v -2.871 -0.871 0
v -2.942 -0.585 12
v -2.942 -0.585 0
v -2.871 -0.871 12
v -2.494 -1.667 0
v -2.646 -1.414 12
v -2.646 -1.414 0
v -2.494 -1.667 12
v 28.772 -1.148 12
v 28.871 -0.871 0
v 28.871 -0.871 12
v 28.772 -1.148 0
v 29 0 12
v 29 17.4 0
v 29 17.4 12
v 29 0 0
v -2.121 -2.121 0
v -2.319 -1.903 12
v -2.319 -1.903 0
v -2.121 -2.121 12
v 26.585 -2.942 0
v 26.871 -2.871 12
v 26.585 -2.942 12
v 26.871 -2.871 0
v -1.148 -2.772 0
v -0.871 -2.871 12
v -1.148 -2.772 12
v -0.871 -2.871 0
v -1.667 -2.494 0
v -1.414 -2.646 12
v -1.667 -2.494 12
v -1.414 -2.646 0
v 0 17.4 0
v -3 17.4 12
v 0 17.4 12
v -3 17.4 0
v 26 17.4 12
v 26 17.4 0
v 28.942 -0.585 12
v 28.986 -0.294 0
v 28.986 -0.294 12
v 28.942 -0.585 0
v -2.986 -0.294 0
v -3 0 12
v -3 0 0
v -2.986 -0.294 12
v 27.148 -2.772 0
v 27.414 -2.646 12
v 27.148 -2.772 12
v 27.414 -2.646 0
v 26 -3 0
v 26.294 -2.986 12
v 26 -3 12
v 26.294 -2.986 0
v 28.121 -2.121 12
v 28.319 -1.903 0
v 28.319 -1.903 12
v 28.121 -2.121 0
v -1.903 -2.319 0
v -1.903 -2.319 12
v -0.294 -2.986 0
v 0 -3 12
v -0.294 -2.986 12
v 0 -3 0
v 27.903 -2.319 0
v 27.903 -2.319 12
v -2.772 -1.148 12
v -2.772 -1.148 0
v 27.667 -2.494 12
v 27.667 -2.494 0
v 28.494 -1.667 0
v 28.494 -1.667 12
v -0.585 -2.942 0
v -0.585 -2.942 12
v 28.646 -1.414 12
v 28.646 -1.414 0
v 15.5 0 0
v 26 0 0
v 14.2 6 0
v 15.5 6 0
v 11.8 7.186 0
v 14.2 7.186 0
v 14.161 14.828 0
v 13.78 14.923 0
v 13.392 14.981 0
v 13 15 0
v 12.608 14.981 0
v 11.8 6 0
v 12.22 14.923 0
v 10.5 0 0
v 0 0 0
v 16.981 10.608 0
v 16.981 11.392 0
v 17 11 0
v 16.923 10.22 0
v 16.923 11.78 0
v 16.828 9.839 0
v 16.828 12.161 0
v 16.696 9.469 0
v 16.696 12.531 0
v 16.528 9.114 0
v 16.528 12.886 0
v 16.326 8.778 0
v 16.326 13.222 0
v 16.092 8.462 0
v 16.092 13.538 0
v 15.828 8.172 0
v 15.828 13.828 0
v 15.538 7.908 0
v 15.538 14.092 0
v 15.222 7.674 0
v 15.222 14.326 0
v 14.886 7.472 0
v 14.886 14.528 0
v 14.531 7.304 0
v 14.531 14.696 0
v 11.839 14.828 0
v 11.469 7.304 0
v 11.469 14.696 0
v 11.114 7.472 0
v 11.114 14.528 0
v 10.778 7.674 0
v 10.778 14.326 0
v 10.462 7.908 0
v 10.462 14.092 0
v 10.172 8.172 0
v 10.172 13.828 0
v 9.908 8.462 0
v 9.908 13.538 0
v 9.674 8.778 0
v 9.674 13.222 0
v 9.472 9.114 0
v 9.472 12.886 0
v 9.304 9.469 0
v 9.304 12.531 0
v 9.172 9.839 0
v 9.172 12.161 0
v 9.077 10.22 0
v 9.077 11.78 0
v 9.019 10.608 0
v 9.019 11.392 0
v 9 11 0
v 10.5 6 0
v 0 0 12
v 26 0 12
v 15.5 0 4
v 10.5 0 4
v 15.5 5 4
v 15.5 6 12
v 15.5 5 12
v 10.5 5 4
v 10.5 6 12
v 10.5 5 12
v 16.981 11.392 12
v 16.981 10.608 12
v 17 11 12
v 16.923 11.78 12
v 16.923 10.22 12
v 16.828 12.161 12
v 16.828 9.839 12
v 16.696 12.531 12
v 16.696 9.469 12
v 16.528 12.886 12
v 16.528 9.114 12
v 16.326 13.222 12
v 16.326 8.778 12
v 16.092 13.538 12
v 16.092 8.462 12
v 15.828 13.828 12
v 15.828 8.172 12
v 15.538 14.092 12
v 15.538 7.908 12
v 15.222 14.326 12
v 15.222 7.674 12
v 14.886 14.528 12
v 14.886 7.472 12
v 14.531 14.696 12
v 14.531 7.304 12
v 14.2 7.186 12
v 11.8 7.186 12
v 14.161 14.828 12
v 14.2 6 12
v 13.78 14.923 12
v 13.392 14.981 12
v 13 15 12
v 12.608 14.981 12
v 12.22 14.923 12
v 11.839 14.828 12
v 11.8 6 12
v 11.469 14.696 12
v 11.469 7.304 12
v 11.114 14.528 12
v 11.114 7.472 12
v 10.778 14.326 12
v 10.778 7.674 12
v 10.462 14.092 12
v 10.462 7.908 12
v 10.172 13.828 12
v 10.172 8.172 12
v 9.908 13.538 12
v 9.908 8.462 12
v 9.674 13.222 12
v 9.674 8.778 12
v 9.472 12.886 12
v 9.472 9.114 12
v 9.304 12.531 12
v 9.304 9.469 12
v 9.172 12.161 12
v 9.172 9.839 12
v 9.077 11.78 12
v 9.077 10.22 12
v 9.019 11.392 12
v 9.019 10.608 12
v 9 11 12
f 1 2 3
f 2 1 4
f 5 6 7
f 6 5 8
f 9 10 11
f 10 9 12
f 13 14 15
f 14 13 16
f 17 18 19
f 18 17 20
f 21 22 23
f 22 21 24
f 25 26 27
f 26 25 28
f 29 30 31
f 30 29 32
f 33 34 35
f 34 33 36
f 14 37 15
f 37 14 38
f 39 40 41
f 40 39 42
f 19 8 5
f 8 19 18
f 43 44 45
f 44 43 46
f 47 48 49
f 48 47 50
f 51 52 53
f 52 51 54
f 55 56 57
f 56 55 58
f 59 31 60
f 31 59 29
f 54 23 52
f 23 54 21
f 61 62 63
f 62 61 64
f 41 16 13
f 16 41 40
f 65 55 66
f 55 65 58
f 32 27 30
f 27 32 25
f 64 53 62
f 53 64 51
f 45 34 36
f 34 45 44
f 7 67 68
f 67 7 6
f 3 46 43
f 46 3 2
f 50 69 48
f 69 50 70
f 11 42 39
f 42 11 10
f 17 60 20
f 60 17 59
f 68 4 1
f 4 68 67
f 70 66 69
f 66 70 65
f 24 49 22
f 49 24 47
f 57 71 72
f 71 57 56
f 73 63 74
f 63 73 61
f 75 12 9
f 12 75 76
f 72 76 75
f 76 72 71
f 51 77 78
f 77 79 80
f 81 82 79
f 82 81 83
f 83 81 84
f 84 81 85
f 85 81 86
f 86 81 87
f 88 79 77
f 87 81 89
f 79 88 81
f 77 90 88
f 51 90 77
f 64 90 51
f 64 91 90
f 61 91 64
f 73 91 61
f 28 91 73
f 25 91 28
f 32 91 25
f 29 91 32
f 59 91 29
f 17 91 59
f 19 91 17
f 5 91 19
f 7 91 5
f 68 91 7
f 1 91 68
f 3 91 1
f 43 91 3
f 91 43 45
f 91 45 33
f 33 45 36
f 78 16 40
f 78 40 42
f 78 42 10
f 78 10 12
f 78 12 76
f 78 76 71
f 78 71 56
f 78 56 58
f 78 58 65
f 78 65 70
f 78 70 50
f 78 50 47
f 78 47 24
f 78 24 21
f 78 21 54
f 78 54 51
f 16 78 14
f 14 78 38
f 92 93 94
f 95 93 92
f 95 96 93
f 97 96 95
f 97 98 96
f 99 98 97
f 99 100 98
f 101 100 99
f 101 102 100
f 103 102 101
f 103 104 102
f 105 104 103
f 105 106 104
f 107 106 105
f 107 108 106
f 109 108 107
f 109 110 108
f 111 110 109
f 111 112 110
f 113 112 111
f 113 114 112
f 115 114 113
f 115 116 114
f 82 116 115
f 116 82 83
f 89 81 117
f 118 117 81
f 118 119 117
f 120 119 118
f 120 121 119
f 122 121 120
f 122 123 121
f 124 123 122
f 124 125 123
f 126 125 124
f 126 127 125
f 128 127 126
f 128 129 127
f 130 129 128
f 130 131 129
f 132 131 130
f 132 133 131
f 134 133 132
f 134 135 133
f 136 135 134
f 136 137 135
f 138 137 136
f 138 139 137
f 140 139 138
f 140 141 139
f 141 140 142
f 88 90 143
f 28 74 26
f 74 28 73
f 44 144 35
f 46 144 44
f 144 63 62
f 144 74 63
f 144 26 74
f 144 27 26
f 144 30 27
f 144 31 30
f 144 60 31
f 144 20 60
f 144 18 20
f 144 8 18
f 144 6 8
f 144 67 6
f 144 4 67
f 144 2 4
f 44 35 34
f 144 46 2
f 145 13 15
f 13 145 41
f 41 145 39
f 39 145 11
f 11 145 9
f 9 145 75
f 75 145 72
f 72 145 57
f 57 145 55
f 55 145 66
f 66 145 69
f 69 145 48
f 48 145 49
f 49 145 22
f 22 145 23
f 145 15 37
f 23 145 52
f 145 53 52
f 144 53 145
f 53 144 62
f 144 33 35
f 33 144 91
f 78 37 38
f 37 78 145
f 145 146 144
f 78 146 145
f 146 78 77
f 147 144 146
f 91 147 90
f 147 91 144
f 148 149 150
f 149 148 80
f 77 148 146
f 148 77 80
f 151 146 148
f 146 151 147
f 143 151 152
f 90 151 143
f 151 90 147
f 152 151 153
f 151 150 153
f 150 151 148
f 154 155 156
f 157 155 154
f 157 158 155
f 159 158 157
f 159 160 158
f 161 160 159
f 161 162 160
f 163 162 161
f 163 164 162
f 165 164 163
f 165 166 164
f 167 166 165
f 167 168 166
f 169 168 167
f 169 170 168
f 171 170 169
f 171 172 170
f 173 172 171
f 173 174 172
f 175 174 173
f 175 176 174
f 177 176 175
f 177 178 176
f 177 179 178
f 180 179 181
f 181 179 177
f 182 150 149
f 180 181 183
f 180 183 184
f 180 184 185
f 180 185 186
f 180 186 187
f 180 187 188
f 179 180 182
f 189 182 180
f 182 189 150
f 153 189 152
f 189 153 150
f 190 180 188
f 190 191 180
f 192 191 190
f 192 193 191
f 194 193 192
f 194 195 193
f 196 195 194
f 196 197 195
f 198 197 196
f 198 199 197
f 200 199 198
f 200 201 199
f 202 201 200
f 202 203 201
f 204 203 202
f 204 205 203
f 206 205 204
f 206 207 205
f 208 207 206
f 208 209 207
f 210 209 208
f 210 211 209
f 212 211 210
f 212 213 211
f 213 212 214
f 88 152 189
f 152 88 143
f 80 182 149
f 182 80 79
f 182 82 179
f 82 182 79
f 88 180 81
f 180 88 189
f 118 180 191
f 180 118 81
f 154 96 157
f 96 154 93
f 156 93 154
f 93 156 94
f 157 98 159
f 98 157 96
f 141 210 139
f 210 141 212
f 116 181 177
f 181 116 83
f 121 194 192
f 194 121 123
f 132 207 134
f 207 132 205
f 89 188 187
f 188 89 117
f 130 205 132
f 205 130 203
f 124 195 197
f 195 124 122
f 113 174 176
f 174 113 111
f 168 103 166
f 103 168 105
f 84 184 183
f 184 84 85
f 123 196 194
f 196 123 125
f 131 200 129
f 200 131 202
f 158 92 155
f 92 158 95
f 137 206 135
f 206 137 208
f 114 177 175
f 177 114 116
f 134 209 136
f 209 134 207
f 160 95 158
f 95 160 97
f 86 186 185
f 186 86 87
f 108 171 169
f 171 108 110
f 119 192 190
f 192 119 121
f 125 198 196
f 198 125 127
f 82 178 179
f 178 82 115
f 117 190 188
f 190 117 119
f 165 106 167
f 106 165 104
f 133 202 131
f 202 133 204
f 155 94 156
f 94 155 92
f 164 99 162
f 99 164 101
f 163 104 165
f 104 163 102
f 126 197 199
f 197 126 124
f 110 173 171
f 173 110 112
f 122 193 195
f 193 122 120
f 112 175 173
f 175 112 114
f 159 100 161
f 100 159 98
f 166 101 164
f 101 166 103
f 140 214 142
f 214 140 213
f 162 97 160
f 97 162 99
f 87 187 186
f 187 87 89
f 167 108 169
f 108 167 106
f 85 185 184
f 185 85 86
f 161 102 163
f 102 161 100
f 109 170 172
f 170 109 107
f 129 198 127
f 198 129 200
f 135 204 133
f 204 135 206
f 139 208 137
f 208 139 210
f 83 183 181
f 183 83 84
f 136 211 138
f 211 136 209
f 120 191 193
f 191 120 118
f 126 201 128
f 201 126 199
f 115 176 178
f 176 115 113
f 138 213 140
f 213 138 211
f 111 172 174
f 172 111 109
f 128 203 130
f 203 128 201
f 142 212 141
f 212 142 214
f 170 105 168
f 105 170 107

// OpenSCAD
$fn=64;
cylinder_diamter = 8;
total_width = 12;
stem_diameter = 2.4;
stem_height = 2;

stem_width = total_width - 4;

corner_radius = 3;
inner_width = 26;
wall_strength = 3;

inner_corner_radius = corner_radius - wall_strength;
inner_inner_width = inner_width - (wall_strength * 2);

connector_cube_width = 5;
connector_cube_height = 5;
connector_cube_thickness = 4;
base_cube_height = 1;

difference() {
    hull() {
        cylinder(r=corner_radius, h=total_width);
        translate([inner_width, 0, 0]) cylinder(r=corner_radius, h=total_width);
        translate([-corner_radius, 0, 0]) cube([inner_width + (corner_radius * 2), 20.4 - corner_radius, total_width]);
    }

    color("green") hull() {
        cylinder(r=inner_corner_radius, h=total_width+2);
        translate([inner_width, 0, 0]) cylinder(r=inner_corner_radius, h=total_width+2);
        translate([-inner_corner_radius, 0, 0]) cube([inner_width + (inner_corner_radius * 2), 30, total_width+2]);
    }
}
color("red") translate([(inner_width / 2) - (connector_cube_width / 2), -3, 0]) cube([connector_cube_width, connector_cube_height + 3, connector_cube_thickness]);
translate([(inner_width / 2) - (connector_cube_width / 2), 5, 0]) cube([connector_cube_width, base_cube_height, 12]);
translate([(inner_width / 2) - (stem_diameter / 2), 5, 0]) cube([stem_diameter, stem_height + 1, total_width]);
translate([(inner_width / 2), connector_cube_height + stem_height + cylinder_diamter / 2, 0]) cylinder(d = cylinder_diamter, h=total_width);


// translate([(inner_width / 2) - stem_diameter, 0, 4]) union() {
//     // cylinder(d = 8, h=stem_width);
//     translate([0, 0, 0]) ;
// }



// %difference() {
//     cube([10, 20, 10]);
//     translate([0, 1, 0]) cube([9, 18, 10]);
// }
